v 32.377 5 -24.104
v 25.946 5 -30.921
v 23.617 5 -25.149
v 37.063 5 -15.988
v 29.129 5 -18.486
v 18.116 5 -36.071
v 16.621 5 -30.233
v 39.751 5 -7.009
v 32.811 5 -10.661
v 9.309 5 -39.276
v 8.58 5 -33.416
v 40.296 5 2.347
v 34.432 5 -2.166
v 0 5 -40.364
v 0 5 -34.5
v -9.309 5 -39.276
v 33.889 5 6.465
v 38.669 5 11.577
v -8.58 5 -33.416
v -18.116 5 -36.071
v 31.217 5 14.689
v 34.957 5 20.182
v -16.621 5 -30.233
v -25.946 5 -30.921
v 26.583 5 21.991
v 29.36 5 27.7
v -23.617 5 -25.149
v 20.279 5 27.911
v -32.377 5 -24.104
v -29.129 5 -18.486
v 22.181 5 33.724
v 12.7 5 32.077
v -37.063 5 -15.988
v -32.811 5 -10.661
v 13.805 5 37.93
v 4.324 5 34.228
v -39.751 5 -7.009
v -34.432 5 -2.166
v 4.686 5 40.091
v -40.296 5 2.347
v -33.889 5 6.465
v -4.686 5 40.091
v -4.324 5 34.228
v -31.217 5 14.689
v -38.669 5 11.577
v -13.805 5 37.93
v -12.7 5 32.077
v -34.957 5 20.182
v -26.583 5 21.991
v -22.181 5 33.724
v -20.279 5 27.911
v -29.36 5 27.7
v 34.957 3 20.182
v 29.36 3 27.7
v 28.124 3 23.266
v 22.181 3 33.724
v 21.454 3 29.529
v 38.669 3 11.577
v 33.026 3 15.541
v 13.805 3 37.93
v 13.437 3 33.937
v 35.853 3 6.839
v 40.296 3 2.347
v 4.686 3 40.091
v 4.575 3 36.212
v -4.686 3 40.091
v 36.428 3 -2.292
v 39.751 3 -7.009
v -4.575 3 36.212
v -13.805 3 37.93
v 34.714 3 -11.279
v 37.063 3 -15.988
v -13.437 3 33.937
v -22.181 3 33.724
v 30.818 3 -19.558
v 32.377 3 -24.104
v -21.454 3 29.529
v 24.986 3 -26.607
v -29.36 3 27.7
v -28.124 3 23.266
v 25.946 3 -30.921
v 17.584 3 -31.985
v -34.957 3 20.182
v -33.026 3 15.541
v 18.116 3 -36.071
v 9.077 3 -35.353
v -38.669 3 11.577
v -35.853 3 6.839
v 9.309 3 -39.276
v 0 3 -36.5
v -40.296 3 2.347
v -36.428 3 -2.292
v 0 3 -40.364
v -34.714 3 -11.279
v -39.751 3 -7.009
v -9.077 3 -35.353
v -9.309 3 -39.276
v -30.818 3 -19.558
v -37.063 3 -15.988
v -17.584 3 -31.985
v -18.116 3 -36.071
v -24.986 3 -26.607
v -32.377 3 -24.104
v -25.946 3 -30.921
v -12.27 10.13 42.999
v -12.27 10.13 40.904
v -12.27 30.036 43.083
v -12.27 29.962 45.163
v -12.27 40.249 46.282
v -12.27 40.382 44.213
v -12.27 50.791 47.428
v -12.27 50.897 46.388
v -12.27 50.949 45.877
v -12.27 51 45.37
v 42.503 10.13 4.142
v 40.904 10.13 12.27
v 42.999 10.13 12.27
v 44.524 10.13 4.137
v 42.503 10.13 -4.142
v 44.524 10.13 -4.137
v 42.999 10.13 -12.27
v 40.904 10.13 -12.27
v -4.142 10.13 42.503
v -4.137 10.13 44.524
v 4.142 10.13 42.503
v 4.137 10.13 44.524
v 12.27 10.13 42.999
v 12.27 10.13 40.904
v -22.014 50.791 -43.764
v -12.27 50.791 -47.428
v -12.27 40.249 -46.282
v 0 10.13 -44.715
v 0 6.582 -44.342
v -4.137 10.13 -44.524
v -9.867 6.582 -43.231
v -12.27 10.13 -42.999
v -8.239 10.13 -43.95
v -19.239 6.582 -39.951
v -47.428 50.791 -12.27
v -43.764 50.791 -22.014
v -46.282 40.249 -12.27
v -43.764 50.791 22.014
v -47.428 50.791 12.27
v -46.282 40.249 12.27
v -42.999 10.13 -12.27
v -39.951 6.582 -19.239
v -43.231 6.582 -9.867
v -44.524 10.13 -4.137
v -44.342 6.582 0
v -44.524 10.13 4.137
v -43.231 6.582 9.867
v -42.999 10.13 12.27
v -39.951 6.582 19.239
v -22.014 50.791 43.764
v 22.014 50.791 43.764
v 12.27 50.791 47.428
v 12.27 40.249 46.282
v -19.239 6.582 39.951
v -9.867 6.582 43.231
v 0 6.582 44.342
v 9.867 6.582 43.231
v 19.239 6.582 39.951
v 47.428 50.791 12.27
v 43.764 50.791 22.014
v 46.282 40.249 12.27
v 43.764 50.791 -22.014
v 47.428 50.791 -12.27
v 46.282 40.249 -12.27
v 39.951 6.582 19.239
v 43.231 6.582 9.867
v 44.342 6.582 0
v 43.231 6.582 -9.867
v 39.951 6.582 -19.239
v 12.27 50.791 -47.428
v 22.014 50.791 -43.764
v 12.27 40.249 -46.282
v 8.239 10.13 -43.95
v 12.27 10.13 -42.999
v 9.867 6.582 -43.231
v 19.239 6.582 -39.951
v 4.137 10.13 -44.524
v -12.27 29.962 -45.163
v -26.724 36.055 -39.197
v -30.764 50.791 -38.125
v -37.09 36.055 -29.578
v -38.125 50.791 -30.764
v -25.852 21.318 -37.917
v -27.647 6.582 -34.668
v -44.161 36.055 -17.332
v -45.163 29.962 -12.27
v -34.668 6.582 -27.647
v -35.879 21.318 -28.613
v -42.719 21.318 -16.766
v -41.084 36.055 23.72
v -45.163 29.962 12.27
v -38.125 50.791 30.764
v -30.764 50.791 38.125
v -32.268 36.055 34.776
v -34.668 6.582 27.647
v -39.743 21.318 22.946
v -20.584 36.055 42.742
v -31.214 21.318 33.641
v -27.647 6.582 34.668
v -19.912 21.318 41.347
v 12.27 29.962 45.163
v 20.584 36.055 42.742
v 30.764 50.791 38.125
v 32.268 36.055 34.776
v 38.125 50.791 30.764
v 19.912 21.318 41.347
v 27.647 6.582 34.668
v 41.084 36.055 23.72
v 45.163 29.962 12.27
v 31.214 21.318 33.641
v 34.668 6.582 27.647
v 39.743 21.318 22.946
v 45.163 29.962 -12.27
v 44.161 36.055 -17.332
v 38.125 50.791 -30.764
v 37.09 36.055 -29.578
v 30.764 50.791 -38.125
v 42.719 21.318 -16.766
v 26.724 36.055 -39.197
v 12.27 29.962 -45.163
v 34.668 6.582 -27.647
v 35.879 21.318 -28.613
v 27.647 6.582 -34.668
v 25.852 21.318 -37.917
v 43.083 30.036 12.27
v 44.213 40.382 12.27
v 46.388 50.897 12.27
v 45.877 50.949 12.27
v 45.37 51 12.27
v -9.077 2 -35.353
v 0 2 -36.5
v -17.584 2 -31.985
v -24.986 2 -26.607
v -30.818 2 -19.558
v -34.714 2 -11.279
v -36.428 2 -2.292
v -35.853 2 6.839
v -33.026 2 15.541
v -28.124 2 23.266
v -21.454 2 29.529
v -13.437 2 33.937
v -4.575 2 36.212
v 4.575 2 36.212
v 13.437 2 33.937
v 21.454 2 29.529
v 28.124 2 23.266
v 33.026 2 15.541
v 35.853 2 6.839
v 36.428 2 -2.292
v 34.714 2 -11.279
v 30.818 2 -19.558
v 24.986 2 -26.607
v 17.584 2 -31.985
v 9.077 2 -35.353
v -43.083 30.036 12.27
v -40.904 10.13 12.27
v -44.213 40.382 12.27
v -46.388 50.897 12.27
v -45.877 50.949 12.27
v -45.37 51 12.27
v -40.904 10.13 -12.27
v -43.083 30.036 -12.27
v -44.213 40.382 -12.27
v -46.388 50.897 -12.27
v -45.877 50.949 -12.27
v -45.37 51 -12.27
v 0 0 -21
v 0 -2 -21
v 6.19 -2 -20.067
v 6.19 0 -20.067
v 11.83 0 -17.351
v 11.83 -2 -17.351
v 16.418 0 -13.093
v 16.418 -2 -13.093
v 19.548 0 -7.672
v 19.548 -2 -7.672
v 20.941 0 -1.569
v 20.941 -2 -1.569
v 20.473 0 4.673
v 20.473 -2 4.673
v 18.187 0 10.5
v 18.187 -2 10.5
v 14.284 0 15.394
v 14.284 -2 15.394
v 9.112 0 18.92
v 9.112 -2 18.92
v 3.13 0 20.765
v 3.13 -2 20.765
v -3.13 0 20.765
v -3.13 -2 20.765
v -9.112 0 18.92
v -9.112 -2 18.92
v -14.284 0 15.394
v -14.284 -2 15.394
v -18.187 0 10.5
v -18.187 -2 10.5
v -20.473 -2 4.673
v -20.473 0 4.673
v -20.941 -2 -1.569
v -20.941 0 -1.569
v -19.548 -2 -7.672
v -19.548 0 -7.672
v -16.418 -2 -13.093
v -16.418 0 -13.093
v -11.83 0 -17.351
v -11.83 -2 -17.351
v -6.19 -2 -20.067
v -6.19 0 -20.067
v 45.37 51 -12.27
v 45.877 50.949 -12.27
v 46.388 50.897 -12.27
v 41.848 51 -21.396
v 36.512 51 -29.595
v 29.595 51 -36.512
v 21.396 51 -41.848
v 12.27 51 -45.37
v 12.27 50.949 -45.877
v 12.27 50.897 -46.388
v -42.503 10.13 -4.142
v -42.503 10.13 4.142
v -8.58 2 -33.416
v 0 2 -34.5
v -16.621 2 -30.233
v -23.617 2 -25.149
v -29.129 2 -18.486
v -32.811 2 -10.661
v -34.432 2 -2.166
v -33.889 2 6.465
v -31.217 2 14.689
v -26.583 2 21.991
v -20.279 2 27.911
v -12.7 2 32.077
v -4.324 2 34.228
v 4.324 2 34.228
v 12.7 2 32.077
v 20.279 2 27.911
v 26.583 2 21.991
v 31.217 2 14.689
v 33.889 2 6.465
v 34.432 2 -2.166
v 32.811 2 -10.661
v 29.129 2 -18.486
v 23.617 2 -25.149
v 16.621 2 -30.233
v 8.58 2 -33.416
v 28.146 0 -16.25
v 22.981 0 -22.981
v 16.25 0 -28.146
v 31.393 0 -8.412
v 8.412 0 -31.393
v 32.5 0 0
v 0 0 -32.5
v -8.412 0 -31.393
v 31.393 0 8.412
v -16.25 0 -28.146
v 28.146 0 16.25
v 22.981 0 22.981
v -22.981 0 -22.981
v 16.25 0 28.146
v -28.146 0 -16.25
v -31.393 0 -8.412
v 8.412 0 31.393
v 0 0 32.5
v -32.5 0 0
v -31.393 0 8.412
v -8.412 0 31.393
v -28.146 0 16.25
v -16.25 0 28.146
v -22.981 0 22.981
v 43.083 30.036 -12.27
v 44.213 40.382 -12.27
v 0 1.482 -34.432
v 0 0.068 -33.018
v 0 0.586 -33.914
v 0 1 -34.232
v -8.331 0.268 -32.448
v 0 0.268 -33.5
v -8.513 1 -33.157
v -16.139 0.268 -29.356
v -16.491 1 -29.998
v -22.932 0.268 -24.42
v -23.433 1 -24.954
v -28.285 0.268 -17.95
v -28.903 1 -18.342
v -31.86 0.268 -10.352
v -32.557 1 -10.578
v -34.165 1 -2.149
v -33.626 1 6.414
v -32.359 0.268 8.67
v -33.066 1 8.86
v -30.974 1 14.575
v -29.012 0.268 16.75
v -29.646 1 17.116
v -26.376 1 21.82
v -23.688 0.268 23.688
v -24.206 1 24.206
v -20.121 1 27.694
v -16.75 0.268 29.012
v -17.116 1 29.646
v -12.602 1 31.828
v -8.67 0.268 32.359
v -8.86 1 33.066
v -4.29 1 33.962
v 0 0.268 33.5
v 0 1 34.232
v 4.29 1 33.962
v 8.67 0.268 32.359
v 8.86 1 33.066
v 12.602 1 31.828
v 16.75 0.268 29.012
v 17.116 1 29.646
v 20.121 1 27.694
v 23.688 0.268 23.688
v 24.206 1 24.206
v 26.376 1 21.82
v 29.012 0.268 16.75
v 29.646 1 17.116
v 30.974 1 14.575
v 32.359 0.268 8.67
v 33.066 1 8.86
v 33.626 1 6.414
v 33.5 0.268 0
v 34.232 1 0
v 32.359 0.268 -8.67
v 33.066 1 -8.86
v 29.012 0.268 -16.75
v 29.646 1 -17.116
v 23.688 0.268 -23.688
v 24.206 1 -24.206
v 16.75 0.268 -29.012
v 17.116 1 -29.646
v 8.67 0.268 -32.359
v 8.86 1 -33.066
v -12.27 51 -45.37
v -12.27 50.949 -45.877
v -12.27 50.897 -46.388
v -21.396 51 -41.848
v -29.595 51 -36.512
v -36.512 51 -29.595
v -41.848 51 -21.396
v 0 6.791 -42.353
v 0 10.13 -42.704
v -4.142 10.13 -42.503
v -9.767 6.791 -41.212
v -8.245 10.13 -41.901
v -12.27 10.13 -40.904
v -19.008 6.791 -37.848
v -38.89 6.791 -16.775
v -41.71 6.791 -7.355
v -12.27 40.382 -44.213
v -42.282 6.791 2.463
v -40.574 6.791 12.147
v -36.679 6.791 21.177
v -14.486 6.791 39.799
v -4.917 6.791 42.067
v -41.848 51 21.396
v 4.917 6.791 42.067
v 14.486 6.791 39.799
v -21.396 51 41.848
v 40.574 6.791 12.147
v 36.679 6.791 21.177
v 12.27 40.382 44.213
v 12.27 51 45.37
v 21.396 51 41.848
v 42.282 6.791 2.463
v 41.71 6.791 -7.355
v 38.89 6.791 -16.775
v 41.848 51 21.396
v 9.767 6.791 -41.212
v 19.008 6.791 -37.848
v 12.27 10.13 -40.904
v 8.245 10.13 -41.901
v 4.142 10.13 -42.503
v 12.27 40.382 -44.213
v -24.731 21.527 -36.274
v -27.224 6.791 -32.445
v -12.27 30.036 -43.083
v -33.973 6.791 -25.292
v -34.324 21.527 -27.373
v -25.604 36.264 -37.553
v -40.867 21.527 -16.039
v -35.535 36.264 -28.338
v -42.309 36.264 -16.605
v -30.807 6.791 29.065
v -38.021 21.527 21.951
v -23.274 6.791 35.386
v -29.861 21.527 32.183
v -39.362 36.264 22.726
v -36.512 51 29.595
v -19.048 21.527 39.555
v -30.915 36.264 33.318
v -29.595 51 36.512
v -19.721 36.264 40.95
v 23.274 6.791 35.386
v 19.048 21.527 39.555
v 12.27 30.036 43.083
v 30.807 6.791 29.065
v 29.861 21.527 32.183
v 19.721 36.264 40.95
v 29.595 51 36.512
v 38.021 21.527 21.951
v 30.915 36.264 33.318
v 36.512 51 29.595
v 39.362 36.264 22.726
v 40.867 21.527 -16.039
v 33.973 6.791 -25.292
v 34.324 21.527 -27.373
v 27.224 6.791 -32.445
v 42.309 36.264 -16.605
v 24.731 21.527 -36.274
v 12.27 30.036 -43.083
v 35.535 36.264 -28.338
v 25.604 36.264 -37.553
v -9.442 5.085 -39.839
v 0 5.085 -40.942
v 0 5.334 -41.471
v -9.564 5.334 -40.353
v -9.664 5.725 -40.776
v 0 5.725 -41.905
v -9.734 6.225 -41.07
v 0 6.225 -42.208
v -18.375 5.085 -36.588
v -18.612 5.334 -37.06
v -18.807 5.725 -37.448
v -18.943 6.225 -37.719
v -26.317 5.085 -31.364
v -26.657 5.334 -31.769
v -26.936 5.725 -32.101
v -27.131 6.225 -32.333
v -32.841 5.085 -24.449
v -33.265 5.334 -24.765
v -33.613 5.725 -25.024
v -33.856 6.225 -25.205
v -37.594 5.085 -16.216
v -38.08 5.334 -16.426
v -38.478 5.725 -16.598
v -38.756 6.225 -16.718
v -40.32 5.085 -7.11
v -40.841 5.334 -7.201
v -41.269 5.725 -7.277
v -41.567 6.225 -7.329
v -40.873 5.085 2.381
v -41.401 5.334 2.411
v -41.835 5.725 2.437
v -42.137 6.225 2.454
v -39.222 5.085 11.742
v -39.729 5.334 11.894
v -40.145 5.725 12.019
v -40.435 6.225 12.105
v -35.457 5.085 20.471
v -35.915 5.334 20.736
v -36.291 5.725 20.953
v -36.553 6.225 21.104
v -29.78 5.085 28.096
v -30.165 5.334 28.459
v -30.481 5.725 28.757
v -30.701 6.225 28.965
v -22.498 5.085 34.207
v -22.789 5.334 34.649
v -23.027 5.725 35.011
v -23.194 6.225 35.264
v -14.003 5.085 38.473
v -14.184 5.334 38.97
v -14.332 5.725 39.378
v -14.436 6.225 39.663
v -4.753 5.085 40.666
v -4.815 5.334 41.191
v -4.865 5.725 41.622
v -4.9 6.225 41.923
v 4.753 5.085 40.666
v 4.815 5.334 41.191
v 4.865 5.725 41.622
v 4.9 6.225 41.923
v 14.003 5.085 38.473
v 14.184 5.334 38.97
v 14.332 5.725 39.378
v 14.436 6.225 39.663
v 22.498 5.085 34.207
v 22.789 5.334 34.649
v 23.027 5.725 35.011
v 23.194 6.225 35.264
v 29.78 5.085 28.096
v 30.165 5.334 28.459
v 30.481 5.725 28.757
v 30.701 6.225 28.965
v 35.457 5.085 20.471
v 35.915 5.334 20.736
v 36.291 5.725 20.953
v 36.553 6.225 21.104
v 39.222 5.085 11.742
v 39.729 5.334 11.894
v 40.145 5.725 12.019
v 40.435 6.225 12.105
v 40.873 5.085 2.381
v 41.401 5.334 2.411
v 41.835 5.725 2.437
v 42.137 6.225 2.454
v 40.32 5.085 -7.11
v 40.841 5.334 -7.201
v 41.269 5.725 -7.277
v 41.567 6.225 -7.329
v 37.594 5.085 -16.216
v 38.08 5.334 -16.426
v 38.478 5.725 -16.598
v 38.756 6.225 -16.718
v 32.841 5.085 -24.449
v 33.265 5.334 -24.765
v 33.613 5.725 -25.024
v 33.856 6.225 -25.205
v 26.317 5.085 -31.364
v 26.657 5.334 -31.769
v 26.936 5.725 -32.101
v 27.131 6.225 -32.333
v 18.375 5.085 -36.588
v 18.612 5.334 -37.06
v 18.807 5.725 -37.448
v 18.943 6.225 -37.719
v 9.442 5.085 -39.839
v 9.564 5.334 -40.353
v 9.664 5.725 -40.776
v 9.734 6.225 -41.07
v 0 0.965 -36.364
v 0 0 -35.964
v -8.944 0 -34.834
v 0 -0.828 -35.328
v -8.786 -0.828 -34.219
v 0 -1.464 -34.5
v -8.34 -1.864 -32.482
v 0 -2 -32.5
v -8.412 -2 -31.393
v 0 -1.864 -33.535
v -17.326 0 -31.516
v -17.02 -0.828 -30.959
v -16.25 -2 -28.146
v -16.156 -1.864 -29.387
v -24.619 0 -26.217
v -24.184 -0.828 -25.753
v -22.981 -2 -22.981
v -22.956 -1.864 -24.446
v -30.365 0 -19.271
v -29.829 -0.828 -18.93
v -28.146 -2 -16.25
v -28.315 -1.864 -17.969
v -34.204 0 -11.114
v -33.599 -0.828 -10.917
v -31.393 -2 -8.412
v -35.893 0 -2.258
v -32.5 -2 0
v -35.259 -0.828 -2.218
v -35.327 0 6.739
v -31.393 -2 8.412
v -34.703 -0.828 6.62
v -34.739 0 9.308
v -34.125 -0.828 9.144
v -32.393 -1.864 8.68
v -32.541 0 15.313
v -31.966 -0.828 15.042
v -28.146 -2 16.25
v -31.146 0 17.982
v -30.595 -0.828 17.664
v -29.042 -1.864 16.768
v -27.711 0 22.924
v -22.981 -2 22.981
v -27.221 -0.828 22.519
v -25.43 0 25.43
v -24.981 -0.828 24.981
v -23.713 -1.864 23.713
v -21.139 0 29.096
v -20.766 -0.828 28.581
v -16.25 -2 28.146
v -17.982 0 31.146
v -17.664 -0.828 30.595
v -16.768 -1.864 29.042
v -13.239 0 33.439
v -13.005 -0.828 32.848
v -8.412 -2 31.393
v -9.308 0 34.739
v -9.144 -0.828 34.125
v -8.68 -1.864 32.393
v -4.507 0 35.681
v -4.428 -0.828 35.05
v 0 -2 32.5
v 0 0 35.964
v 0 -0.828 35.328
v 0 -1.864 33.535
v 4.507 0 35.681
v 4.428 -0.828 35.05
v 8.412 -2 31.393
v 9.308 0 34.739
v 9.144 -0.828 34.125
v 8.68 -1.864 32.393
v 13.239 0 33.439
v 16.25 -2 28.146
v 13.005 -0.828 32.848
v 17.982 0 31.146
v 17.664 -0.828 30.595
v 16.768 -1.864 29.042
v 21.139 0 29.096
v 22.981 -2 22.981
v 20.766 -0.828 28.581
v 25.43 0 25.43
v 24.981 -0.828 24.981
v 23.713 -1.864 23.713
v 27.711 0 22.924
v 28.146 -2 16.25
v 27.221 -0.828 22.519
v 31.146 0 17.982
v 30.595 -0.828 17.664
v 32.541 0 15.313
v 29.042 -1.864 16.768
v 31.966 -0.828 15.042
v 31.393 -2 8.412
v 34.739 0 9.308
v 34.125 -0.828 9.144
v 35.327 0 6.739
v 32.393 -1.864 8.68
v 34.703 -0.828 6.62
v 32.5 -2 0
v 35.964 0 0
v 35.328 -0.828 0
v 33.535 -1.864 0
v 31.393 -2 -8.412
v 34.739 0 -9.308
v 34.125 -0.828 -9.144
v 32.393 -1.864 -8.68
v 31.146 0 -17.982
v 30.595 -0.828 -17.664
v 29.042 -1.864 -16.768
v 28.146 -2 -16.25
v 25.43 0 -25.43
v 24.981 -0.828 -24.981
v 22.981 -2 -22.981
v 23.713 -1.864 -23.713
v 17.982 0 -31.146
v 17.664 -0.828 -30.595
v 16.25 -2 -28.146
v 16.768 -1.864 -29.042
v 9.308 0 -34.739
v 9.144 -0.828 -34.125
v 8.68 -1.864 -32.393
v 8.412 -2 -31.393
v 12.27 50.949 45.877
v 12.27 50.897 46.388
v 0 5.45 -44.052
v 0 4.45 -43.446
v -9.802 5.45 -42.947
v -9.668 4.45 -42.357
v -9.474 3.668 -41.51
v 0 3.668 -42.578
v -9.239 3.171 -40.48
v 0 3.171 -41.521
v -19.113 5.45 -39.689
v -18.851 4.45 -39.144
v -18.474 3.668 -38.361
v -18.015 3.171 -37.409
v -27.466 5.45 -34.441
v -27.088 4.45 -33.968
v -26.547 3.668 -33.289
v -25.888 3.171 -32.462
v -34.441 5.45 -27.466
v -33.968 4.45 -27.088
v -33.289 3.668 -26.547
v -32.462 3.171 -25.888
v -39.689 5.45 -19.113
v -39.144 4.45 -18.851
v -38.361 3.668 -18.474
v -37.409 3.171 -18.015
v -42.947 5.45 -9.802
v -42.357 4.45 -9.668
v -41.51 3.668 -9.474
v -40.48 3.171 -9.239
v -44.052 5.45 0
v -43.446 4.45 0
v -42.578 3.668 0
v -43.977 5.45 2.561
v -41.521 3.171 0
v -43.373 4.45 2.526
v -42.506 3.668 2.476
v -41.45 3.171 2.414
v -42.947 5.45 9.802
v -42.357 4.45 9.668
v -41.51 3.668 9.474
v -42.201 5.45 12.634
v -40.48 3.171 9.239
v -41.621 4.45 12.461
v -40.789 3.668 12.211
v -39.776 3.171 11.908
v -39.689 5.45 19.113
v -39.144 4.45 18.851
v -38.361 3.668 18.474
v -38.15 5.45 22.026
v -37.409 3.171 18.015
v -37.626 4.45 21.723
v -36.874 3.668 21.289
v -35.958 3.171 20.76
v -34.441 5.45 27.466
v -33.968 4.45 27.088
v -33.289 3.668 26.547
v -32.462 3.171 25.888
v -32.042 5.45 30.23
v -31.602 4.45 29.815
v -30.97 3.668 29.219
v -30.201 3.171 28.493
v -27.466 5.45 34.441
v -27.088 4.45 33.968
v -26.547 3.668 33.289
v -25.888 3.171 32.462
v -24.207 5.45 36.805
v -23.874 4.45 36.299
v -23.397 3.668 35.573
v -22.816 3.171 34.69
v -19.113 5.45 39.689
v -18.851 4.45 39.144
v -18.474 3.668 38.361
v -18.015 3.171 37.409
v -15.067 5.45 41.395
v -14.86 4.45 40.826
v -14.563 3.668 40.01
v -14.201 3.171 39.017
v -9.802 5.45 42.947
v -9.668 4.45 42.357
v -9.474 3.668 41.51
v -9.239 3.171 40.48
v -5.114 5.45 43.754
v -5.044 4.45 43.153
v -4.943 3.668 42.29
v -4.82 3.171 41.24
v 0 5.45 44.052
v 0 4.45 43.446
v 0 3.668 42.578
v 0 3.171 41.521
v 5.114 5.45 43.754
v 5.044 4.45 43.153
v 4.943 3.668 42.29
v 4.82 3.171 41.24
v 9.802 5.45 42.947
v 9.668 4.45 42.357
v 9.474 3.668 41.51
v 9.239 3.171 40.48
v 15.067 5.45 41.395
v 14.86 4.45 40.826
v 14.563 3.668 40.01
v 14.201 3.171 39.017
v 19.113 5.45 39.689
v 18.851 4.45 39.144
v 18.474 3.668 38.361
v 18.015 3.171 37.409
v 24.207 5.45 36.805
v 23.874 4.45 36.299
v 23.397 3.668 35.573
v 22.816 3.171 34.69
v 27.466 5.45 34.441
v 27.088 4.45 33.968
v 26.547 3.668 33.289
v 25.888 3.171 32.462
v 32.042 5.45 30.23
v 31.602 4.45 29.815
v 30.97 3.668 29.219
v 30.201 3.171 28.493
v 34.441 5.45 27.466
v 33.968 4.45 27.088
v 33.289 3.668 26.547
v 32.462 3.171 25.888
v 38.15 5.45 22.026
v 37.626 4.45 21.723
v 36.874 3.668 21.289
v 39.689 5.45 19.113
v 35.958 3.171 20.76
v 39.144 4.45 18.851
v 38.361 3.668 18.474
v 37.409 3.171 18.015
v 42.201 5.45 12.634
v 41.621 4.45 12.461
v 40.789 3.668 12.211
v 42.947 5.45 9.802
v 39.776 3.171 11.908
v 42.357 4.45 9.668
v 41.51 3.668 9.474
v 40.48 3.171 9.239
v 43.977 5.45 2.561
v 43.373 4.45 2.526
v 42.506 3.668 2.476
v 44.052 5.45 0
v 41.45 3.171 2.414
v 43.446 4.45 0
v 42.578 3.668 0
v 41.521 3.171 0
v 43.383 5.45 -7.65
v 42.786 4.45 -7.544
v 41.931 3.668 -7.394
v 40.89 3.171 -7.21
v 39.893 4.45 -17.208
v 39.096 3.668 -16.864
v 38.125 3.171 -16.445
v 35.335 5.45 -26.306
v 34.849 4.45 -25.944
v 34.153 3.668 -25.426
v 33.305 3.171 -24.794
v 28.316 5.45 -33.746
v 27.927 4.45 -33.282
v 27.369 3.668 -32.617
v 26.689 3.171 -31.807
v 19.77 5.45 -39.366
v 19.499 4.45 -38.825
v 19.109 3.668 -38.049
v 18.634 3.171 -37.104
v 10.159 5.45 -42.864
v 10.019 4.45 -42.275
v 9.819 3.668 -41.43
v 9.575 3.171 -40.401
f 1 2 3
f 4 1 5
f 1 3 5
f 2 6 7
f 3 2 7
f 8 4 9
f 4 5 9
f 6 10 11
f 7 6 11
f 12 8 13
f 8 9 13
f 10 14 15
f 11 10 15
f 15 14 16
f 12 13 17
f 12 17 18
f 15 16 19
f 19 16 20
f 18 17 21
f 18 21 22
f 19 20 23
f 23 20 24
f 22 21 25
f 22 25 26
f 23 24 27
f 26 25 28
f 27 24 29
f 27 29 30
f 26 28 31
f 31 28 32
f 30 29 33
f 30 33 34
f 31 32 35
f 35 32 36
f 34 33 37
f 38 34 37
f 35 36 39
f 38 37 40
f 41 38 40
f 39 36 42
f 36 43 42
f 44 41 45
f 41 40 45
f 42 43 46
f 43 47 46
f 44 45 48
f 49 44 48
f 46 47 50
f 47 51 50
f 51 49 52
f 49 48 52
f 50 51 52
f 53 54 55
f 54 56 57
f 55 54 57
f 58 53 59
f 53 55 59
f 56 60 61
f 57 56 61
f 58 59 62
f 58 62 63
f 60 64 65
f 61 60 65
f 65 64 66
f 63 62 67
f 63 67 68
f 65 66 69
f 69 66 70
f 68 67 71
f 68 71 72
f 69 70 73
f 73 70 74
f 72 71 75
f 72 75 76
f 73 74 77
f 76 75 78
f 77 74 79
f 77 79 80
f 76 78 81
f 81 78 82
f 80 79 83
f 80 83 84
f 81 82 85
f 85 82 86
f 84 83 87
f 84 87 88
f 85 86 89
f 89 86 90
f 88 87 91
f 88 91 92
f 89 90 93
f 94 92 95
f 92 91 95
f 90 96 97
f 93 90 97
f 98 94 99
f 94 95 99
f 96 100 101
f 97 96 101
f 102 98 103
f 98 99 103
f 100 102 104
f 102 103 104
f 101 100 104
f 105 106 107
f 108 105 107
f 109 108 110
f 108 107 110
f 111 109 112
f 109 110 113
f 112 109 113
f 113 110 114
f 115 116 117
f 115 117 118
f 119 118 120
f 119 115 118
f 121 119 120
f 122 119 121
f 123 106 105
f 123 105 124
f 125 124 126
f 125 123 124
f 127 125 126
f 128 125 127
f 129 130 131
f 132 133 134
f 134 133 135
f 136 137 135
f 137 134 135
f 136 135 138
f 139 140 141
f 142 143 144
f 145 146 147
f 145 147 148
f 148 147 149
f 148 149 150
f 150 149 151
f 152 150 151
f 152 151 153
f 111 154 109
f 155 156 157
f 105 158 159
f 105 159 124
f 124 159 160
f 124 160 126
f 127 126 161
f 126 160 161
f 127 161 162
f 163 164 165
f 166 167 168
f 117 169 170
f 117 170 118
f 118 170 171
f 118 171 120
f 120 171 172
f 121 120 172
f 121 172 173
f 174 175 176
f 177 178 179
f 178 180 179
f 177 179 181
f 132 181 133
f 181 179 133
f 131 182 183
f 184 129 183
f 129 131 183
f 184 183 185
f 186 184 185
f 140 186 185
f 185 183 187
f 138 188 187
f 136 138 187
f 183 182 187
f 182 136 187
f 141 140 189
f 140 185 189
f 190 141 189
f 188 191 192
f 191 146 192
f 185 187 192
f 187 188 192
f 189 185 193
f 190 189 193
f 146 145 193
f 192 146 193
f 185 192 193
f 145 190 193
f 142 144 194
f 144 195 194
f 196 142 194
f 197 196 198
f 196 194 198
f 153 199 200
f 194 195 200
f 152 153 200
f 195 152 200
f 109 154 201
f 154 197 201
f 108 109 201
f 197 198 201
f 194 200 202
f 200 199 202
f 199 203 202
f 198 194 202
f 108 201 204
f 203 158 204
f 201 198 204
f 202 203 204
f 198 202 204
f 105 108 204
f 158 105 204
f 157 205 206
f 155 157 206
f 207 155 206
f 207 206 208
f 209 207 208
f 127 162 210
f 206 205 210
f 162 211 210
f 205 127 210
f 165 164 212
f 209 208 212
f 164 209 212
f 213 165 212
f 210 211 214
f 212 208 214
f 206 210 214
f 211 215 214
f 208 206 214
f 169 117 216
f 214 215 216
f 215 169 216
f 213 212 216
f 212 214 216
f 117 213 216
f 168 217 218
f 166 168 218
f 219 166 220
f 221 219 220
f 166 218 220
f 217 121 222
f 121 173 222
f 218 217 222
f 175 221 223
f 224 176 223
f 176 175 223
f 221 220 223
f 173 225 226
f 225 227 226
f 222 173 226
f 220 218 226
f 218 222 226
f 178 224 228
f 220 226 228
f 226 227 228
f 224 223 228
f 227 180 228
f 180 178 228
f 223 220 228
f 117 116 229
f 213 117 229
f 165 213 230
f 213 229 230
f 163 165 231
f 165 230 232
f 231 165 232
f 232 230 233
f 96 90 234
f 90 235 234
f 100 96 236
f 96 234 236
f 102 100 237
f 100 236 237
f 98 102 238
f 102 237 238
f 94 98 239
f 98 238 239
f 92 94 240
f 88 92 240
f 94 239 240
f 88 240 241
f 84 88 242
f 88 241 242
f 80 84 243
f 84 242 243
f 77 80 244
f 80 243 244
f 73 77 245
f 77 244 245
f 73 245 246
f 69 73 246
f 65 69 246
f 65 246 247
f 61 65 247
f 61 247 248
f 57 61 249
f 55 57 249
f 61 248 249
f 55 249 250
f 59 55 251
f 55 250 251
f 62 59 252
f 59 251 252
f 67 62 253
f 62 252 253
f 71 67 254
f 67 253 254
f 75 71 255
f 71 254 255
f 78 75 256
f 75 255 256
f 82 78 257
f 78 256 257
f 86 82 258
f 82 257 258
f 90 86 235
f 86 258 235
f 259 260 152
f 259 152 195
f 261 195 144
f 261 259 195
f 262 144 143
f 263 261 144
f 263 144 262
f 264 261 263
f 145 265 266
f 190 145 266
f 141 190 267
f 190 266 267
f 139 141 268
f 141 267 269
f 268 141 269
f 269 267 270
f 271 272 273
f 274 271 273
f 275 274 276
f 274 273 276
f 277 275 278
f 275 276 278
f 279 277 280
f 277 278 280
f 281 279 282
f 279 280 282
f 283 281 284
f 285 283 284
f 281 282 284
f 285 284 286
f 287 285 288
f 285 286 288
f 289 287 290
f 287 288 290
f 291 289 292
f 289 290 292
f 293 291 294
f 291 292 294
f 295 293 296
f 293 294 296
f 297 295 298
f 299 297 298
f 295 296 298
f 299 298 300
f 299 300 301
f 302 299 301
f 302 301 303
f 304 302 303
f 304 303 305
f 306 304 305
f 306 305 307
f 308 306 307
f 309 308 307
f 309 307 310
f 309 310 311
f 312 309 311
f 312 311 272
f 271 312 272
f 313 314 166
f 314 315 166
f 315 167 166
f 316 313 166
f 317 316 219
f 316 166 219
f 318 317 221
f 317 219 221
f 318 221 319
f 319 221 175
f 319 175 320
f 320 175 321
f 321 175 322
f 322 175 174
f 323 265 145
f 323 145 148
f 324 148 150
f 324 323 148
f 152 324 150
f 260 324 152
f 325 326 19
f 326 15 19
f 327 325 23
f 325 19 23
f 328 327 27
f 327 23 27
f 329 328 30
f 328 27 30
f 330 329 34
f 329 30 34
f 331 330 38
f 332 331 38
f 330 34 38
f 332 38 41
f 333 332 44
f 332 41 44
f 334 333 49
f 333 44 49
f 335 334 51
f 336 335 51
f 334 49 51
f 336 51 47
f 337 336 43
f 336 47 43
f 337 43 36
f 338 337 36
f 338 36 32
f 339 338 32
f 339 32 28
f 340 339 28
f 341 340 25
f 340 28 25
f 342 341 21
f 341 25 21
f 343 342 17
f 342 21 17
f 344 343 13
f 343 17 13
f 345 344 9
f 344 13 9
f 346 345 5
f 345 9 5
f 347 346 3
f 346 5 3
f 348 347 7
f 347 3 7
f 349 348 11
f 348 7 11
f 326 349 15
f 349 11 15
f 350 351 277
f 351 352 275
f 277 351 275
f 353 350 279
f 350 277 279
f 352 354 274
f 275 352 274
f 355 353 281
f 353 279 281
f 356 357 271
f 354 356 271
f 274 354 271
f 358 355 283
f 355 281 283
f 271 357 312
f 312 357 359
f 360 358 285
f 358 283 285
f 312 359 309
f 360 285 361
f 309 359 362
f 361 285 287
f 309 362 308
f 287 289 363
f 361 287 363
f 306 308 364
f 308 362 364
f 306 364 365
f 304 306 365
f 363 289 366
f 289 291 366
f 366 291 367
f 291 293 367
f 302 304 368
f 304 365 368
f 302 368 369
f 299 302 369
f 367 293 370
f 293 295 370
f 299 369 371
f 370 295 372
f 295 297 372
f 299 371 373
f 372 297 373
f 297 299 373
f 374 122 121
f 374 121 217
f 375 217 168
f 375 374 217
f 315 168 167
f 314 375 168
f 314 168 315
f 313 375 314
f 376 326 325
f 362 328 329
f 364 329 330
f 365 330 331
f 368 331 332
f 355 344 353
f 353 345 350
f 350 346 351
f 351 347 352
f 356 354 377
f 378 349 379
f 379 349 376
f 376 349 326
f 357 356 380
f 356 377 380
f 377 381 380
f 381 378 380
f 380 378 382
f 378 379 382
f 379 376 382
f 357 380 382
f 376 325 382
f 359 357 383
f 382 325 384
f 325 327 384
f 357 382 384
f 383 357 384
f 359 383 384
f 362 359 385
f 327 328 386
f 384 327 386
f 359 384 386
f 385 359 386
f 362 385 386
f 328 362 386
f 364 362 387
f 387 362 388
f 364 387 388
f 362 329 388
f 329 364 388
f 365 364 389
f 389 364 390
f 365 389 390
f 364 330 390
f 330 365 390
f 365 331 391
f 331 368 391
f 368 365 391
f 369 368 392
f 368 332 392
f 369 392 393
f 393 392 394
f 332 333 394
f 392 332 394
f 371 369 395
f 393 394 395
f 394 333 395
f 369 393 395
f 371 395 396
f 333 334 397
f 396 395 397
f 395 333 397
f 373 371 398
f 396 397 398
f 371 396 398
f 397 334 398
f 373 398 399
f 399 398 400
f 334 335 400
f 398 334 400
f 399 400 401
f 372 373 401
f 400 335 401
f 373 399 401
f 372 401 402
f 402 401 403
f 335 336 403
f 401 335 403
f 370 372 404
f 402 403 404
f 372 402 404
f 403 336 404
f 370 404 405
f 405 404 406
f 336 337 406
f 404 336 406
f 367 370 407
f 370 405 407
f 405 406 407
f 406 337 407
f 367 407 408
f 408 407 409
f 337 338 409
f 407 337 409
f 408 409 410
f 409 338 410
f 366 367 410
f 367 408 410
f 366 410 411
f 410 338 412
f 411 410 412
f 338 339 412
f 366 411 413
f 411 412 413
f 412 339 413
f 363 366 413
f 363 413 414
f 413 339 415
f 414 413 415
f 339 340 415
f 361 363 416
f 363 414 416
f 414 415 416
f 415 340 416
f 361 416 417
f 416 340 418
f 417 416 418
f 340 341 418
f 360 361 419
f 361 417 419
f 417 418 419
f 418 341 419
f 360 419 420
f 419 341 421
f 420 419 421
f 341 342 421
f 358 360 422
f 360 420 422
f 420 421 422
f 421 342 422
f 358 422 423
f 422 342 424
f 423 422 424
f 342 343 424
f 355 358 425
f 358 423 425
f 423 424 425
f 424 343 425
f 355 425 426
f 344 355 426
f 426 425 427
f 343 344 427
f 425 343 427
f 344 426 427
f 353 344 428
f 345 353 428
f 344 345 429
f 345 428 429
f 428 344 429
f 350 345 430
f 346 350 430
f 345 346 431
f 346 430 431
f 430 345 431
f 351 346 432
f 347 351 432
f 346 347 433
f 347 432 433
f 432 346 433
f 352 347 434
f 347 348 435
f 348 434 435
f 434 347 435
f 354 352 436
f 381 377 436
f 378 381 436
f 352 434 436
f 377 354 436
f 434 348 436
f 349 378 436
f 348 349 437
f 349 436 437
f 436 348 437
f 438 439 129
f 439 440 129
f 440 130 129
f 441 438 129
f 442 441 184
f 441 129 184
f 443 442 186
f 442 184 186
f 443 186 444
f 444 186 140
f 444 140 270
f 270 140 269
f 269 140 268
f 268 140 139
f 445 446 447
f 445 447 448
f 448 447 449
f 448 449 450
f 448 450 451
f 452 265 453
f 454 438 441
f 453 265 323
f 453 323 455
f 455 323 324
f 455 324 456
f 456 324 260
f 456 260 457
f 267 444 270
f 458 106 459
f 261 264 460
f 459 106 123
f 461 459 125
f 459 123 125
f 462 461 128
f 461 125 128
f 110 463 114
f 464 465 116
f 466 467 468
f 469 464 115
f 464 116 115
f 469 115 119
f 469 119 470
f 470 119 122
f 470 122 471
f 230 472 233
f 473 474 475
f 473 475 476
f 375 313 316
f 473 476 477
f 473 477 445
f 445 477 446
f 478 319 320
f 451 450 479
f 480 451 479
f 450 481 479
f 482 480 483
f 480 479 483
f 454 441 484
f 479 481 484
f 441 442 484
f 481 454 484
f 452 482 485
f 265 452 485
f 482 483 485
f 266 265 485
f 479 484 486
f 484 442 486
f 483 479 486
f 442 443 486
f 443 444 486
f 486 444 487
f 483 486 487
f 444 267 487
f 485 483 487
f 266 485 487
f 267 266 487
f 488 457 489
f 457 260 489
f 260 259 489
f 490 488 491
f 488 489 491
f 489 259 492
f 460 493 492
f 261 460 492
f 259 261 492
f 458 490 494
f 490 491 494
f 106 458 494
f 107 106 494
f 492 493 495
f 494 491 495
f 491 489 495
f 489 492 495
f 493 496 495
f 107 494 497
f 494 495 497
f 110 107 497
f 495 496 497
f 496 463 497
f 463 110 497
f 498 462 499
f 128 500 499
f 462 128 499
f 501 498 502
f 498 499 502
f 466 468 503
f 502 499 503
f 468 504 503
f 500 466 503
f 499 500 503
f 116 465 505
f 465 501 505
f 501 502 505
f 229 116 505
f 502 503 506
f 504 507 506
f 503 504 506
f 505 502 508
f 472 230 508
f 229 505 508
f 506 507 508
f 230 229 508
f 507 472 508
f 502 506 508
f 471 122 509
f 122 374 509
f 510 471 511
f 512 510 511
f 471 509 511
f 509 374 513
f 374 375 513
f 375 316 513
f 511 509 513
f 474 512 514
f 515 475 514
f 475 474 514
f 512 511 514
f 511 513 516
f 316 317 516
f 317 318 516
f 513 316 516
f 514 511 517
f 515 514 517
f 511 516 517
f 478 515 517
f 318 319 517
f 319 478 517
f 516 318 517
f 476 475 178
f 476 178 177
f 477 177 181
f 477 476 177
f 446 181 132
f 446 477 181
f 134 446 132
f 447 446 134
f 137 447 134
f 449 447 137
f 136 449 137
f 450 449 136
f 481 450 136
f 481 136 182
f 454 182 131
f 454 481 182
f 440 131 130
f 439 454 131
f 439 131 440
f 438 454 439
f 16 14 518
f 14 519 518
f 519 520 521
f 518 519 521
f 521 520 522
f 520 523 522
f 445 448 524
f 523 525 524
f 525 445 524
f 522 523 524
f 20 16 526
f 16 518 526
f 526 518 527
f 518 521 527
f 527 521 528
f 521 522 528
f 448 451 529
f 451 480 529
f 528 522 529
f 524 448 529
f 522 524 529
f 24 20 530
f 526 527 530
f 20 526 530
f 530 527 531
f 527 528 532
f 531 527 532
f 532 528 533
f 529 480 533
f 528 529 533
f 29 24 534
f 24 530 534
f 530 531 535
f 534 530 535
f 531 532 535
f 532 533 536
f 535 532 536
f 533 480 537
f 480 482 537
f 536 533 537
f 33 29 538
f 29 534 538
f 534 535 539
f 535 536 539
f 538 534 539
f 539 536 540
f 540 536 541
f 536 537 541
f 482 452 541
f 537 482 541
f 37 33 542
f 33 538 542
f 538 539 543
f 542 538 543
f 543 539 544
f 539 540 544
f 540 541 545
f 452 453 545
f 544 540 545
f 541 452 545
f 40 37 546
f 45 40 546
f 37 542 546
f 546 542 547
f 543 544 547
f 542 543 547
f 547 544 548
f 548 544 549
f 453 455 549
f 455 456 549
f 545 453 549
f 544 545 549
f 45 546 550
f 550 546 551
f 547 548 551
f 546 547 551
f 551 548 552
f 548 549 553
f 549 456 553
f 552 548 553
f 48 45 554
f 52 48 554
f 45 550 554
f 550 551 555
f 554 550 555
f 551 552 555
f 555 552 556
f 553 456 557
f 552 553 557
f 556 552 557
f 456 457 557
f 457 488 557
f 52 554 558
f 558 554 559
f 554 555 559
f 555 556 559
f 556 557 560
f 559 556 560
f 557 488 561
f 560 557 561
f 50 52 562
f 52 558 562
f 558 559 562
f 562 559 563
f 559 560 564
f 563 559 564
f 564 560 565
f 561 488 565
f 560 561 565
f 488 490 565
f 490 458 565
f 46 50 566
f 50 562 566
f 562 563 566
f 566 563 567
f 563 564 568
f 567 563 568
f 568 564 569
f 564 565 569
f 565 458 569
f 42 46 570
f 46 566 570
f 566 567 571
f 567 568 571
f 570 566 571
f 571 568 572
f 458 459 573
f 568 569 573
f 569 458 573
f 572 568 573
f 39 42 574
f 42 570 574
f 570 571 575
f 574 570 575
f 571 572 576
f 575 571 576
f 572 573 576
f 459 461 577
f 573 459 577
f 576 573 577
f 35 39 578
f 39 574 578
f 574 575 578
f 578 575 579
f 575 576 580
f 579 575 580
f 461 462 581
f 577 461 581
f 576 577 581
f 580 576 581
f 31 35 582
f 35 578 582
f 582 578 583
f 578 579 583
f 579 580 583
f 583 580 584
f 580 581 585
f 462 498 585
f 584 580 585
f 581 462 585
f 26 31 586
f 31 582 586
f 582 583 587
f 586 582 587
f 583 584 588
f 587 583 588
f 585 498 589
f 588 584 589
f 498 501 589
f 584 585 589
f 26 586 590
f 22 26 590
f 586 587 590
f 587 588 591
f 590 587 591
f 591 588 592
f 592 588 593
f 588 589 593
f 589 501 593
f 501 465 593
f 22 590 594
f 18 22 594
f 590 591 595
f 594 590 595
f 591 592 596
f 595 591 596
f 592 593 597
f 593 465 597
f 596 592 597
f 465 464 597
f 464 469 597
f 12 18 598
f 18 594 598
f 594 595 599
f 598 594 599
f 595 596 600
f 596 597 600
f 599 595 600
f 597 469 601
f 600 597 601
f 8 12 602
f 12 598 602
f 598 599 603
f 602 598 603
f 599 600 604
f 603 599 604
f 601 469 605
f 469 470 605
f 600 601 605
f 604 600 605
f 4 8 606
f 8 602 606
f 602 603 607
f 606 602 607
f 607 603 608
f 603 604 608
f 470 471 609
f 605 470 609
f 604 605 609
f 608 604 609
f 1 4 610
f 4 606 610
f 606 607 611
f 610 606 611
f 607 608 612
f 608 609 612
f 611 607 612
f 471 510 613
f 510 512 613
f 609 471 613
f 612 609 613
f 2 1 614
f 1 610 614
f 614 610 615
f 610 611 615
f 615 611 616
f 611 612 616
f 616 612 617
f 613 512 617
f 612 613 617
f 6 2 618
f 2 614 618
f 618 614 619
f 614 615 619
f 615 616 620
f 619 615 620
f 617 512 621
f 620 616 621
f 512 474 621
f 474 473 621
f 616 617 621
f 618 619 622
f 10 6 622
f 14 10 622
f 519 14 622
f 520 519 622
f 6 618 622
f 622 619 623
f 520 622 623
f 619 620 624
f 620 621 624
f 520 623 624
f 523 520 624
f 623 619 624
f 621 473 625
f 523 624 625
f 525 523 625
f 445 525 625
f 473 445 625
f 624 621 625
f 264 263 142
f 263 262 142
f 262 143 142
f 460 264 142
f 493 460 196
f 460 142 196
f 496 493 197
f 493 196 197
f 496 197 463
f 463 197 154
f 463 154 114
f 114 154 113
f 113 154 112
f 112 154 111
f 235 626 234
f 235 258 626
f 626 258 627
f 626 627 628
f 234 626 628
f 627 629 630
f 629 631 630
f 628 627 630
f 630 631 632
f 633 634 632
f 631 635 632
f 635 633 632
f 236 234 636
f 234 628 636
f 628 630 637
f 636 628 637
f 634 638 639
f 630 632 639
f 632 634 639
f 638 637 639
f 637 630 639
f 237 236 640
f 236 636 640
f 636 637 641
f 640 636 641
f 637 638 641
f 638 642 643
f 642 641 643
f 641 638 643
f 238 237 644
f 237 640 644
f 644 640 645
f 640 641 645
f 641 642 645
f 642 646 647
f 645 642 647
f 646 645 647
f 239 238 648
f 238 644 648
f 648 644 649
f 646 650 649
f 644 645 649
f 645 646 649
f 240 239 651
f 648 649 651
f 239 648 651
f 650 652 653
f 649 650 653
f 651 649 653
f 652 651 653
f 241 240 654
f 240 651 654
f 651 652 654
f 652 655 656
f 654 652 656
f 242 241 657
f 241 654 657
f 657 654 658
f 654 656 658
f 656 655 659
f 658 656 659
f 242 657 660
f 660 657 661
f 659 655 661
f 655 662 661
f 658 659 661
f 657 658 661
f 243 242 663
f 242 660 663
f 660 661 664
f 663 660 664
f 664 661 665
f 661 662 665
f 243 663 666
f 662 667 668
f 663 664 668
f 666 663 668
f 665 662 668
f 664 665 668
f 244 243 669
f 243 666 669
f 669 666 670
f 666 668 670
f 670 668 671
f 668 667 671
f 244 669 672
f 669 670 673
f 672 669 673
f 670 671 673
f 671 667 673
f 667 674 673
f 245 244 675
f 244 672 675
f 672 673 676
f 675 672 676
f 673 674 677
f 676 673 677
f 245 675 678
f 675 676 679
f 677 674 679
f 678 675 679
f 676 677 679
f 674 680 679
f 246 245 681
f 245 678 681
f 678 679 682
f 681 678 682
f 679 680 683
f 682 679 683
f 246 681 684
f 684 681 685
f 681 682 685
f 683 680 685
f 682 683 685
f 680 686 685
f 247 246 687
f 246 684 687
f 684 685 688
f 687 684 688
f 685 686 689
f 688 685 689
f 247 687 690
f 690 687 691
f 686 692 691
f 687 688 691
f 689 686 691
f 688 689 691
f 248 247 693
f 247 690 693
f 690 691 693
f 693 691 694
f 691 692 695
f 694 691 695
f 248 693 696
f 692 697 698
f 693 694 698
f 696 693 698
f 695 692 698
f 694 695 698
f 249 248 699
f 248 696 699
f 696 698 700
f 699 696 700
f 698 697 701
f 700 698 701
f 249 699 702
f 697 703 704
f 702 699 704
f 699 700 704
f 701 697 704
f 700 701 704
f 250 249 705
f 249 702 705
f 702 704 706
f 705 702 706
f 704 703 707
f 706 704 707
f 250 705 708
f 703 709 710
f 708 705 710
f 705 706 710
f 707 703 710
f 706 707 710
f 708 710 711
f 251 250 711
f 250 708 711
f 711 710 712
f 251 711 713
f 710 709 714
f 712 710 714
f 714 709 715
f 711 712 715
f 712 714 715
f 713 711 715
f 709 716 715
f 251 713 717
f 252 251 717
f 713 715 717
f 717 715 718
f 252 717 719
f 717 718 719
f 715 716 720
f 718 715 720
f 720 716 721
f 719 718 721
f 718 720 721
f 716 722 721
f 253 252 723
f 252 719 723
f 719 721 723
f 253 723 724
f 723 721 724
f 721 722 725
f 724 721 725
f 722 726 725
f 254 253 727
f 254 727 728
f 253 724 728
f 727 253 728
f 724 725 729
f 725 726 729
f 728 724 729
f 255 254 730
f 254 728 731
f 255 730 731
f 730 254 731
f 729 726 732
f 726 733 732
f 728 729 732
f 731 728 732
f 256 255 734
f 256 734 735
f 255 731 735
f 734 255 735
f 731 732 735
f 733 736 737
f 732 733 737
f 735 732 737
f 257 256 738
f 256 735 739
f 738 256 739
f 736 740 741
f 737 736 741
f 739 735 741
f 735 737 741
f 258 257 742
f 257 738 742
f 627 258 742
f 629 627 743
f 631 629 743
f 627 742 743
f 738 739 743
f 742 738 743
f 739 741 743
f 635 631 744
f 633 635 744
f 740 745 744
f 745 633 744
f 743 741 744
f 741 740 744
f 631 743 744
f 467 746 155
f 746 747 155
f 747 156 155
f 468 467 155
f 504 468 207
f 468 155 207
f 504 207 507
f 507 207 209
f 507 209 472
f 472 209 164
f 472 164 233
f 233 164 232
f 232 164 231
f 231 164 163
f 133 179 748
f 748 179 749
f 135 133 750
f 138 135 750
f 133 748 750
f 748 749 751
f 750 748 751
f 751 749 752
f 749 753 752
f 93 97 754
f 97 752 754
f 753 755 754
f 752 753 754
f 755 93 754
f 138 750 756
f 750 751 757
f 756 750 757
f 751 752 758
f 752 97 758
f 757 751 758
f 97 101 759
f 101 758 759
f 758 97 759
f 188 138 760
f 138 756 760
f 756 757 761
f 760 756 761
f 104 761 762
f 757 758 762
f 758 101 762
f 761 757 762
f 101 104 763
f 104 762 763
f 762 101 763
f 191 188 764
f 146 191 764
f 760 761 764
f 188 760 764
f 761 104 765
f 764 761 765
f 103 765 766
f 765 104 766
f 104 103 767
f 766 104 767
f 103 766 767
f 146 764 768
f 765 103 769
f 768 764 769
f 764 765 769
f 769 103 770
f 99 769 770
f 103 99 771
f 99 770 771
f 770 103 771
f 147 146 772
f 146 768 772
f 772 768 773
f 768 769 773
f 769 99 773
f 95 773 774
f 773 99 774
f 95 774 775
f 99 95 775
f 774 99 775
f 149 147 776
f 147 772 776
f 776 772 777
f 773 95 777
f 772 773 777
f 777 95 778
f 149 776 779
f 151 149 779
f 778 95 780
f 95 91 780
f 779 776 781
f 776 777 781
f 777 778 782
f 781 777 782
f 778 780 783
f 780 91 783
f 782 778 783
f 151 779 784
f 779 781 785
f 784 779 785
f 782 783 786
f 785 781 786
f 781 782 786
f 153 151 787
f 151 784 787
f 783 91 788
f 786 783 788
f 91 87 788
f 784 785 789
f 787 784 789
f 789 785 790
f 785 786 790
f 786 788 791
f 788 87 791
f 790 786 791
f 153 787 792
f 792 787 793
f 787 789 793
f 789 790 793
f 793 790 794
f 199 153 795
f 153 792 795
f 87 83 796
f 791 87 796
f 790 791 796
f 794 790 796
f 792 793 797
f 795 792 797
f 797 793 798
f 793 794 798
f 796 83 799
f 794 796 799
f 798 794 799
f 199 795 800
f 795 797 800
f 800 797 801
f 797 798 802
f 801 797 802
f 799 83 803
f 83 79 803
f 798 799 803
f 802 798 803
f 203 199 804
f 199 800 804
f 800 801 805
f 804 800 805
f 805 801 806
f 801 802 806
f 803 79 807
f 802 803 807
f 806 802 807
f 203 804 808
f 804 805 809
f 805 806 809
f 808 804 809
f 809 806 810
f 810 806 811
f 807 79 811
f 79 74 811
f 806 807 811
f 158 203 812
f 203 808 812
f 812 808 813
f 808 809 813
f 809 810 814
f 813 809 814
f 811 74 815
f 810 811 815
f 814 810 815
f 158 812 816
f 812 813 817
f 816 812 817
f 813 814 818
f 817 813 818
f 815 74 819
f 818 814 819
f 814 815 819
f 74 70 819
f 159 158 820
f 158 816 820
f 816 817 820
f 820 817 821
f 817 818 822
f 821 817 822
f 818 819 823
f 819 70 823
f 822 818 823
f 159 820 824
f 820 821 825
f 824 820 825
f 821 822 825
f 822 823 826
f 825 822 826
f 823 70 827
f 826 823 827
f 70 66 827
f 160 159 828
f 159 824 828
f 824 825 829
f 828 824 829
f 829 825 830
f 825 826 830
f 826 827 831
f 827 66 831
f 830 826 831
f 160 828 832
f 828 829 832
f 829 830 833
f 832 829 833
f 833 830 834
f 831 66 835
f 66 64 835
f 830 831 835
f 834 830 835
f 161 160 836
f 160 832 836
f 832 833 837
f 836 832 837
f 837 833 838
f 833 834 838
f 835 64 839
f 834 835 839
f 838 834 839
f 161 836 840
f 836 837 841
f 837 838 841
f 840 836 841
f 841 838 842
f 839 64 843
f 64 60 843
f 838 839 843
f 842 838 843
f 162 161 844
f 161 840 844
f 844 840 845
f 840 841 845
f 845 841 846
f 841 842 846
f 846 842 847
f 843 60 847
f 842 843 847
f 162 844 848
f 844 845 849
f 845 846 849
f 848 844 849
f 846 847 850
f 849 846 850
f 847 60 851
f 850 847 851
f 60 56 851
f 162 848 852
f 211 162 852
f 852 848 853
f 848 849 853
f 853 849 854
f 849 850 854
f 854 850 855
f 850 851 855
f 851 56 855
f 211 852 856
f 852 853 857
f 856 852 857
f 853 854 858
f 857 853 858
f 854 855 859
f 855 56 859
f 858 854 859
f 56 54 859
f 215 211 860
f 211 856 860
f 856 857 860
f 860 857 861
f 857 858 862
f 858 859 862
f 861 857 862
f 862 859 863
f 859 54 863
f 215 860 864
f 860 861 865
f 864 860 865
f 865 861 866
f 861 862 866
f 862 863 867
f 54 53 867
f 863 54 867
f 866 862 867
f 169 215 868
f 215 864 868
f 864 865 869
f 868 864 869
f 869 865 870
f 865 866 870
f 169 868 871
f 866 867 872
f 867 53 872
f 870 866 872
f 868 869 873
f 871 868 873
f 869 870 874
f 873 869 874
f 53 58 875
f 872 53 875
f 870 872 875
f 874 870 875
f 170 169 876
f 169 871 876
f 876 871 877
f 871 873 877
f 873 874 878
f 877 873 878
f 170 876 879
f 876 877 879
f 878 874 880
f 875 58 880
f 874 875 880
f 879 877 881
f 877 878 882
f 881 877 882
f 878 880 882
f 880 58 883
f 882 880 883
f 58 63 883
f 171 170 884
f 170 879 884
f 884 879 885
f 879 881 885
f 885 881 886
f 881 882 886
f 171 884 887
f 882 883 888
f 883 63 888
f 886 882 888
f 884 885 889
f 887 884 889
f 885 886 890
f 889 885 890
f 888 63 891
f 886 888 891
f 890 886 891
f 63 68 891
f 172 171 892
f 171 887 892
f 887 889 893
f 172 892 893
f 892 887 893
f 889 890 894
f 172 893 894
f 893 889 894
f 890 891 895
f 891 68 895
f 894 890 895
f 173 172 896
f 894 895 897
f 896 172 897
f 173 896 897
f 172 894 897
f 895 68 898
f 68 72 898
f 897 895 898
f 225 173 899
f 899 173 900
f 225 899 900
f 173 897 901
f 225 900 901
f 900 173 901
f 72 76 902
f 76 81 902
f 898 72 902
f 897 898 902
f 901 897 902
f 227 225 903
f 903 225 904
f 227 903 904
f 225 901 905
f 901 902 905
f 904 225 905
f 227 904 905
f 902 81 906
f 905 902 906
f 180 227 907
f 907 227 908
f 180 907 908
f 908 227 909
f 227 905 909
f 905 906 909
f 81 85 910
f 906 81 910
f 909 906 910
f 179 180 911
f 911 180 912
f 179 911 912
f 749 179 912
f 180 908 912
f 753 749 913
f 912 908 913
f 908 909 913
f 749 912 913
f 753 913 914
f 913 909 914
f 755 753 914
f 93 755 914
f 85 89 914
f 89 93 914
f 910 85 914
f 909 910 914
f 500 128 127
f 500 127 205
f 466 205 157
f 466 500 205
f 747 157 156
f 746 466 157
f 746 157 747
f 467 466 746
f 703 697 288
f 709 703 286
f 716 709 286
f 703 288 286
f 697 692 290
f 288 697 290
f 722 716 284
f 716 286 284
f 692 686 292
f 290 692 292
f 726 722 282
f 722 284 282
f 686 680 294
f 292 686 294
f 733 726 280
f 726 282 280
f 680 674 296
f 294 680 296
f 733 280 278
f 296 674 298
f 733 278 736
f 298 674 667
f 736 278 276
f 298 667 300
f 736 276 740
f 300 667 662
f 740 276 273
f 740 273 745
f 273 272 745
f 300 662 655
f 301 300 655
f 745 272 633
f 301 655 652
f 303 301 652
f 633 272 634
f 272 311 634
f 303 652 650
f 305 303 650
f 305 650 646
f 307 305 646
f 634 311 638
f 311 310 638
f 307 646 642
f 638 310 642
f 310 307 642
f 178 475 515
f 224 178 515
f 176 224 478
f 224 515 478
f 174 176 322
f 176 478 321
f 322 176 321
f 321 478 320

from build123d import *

# Parameters (mm, degrees)
CUT_EXTRUDE1_REACH = 88.028
SKETCH2_W          = 24.54
SKETCH2_H          = 40.87
CIRPATTERN1_COUNT  = 4
CUT_EXTRUDE2_REACH = 87.485
SKETCH3_R          = 21


with BuildPart() as part:
    # Sketch1 → Revolve-Thin1 (revolve)
    with BuildSketch(Plane.XY, mode=Mode.PRIVATE) as revolve_thin1_sk:
        with BuildLine():
            Line((0, 0), (32.5, 0))
            ThreePointArc((32.5, 0), (33.914213562, 0.585786438), (34.5, 2))
            Line((34.5, 2), (34.5, 5))
            Line((34.5, 5), (40.364397089, 5))
            ThreePointArc((40.364397089, 5), (41.702658302, 5.513710349), (42.35344088, 6.790943073))
            Line((42.35344088, 6.790943073), (47, 51))
            Line((47, 51), (48.989043791, 50.790943073))
            Line((48.989043791, 50.790943073), (44.342484671, 6.581886147))
            ThreePointArc((44.342484671, 6.581886147), (43.040919515, 4.027420698), (40.364397089, 3))
            Line((40.364397089, 3), (36.5, 3))
            Line((36.5, 3), (36.5, 2))
            ThreePointArc((36.5, 2), (35.328427125, -0.828427125), (32.5, -2))
            Line((32.5, -2), (0, -2))
            Line((0, -2), (0, 0))
        make_face()
    revolve(revolve_thin1_sk.sketch.rotate(Axis((0, 0, 0), (0, 1, 0)), 90), axis=Axis((0, 0, 0), (0, 1, 0)))

    # Sketch2 → Cut-Extrude1 (cut, up to next)
    with BuildSketch(Plane.XY, mode=Mode.PRIVATE) as cut_extrude1_sk1:
        with Locations((0, 30.565)):
            Rectangle(SKETCH2_W, SKETCH2_H)
    cut_extrude1_tool1 = extrude(cut_extrude1_sk1.sketch, amount=CUT_EXTRUDE1_REACH, mode=Mode.PRIVATE) & part.part
    cut_extrude1 = cut_extrude1_tool1.solids().sort_by_distance((0, 30.565, 0))[0]
    add(cut_extrude1, mode=Mode.SUBTRACT)

    # CirPattern1: Cut-Extrude1 ×4 about axis
    cirpattern1_axis = Axis((0, 0, 0), (0, 1, 0))
    for i in range(1, CIRPATTERN1_COUNT):
        add(cut_extrude1.rotate(cirpattern1_axis, i * 360 / CIRPATTERN1_COUNT), mode=Mode.SUBTRACT)

    # Sketch3 → Cut-Extrude2 (cut, up to next)
    with BuildSketch(Plane.XZ.offset(2), mode=Mode.PRIVATE) as cut_extrude2_sk1:
        with Locations(Location((0, 0, 0), (0, 0, 270))):
            Circle(SKETCH3_R)
    cut_extrude2_tool1 = extrude(cut_extrude2_sk1.sketch, amount=-CUT_EXTRUDE2_REACH, mode=Mode.PRIVATE) & part.part
    add(cut_extrude2_tool1.solids().sort_by_distance((0, -2, 0))[0], mode=Mode.SUBTRACT)


solid = part.part
